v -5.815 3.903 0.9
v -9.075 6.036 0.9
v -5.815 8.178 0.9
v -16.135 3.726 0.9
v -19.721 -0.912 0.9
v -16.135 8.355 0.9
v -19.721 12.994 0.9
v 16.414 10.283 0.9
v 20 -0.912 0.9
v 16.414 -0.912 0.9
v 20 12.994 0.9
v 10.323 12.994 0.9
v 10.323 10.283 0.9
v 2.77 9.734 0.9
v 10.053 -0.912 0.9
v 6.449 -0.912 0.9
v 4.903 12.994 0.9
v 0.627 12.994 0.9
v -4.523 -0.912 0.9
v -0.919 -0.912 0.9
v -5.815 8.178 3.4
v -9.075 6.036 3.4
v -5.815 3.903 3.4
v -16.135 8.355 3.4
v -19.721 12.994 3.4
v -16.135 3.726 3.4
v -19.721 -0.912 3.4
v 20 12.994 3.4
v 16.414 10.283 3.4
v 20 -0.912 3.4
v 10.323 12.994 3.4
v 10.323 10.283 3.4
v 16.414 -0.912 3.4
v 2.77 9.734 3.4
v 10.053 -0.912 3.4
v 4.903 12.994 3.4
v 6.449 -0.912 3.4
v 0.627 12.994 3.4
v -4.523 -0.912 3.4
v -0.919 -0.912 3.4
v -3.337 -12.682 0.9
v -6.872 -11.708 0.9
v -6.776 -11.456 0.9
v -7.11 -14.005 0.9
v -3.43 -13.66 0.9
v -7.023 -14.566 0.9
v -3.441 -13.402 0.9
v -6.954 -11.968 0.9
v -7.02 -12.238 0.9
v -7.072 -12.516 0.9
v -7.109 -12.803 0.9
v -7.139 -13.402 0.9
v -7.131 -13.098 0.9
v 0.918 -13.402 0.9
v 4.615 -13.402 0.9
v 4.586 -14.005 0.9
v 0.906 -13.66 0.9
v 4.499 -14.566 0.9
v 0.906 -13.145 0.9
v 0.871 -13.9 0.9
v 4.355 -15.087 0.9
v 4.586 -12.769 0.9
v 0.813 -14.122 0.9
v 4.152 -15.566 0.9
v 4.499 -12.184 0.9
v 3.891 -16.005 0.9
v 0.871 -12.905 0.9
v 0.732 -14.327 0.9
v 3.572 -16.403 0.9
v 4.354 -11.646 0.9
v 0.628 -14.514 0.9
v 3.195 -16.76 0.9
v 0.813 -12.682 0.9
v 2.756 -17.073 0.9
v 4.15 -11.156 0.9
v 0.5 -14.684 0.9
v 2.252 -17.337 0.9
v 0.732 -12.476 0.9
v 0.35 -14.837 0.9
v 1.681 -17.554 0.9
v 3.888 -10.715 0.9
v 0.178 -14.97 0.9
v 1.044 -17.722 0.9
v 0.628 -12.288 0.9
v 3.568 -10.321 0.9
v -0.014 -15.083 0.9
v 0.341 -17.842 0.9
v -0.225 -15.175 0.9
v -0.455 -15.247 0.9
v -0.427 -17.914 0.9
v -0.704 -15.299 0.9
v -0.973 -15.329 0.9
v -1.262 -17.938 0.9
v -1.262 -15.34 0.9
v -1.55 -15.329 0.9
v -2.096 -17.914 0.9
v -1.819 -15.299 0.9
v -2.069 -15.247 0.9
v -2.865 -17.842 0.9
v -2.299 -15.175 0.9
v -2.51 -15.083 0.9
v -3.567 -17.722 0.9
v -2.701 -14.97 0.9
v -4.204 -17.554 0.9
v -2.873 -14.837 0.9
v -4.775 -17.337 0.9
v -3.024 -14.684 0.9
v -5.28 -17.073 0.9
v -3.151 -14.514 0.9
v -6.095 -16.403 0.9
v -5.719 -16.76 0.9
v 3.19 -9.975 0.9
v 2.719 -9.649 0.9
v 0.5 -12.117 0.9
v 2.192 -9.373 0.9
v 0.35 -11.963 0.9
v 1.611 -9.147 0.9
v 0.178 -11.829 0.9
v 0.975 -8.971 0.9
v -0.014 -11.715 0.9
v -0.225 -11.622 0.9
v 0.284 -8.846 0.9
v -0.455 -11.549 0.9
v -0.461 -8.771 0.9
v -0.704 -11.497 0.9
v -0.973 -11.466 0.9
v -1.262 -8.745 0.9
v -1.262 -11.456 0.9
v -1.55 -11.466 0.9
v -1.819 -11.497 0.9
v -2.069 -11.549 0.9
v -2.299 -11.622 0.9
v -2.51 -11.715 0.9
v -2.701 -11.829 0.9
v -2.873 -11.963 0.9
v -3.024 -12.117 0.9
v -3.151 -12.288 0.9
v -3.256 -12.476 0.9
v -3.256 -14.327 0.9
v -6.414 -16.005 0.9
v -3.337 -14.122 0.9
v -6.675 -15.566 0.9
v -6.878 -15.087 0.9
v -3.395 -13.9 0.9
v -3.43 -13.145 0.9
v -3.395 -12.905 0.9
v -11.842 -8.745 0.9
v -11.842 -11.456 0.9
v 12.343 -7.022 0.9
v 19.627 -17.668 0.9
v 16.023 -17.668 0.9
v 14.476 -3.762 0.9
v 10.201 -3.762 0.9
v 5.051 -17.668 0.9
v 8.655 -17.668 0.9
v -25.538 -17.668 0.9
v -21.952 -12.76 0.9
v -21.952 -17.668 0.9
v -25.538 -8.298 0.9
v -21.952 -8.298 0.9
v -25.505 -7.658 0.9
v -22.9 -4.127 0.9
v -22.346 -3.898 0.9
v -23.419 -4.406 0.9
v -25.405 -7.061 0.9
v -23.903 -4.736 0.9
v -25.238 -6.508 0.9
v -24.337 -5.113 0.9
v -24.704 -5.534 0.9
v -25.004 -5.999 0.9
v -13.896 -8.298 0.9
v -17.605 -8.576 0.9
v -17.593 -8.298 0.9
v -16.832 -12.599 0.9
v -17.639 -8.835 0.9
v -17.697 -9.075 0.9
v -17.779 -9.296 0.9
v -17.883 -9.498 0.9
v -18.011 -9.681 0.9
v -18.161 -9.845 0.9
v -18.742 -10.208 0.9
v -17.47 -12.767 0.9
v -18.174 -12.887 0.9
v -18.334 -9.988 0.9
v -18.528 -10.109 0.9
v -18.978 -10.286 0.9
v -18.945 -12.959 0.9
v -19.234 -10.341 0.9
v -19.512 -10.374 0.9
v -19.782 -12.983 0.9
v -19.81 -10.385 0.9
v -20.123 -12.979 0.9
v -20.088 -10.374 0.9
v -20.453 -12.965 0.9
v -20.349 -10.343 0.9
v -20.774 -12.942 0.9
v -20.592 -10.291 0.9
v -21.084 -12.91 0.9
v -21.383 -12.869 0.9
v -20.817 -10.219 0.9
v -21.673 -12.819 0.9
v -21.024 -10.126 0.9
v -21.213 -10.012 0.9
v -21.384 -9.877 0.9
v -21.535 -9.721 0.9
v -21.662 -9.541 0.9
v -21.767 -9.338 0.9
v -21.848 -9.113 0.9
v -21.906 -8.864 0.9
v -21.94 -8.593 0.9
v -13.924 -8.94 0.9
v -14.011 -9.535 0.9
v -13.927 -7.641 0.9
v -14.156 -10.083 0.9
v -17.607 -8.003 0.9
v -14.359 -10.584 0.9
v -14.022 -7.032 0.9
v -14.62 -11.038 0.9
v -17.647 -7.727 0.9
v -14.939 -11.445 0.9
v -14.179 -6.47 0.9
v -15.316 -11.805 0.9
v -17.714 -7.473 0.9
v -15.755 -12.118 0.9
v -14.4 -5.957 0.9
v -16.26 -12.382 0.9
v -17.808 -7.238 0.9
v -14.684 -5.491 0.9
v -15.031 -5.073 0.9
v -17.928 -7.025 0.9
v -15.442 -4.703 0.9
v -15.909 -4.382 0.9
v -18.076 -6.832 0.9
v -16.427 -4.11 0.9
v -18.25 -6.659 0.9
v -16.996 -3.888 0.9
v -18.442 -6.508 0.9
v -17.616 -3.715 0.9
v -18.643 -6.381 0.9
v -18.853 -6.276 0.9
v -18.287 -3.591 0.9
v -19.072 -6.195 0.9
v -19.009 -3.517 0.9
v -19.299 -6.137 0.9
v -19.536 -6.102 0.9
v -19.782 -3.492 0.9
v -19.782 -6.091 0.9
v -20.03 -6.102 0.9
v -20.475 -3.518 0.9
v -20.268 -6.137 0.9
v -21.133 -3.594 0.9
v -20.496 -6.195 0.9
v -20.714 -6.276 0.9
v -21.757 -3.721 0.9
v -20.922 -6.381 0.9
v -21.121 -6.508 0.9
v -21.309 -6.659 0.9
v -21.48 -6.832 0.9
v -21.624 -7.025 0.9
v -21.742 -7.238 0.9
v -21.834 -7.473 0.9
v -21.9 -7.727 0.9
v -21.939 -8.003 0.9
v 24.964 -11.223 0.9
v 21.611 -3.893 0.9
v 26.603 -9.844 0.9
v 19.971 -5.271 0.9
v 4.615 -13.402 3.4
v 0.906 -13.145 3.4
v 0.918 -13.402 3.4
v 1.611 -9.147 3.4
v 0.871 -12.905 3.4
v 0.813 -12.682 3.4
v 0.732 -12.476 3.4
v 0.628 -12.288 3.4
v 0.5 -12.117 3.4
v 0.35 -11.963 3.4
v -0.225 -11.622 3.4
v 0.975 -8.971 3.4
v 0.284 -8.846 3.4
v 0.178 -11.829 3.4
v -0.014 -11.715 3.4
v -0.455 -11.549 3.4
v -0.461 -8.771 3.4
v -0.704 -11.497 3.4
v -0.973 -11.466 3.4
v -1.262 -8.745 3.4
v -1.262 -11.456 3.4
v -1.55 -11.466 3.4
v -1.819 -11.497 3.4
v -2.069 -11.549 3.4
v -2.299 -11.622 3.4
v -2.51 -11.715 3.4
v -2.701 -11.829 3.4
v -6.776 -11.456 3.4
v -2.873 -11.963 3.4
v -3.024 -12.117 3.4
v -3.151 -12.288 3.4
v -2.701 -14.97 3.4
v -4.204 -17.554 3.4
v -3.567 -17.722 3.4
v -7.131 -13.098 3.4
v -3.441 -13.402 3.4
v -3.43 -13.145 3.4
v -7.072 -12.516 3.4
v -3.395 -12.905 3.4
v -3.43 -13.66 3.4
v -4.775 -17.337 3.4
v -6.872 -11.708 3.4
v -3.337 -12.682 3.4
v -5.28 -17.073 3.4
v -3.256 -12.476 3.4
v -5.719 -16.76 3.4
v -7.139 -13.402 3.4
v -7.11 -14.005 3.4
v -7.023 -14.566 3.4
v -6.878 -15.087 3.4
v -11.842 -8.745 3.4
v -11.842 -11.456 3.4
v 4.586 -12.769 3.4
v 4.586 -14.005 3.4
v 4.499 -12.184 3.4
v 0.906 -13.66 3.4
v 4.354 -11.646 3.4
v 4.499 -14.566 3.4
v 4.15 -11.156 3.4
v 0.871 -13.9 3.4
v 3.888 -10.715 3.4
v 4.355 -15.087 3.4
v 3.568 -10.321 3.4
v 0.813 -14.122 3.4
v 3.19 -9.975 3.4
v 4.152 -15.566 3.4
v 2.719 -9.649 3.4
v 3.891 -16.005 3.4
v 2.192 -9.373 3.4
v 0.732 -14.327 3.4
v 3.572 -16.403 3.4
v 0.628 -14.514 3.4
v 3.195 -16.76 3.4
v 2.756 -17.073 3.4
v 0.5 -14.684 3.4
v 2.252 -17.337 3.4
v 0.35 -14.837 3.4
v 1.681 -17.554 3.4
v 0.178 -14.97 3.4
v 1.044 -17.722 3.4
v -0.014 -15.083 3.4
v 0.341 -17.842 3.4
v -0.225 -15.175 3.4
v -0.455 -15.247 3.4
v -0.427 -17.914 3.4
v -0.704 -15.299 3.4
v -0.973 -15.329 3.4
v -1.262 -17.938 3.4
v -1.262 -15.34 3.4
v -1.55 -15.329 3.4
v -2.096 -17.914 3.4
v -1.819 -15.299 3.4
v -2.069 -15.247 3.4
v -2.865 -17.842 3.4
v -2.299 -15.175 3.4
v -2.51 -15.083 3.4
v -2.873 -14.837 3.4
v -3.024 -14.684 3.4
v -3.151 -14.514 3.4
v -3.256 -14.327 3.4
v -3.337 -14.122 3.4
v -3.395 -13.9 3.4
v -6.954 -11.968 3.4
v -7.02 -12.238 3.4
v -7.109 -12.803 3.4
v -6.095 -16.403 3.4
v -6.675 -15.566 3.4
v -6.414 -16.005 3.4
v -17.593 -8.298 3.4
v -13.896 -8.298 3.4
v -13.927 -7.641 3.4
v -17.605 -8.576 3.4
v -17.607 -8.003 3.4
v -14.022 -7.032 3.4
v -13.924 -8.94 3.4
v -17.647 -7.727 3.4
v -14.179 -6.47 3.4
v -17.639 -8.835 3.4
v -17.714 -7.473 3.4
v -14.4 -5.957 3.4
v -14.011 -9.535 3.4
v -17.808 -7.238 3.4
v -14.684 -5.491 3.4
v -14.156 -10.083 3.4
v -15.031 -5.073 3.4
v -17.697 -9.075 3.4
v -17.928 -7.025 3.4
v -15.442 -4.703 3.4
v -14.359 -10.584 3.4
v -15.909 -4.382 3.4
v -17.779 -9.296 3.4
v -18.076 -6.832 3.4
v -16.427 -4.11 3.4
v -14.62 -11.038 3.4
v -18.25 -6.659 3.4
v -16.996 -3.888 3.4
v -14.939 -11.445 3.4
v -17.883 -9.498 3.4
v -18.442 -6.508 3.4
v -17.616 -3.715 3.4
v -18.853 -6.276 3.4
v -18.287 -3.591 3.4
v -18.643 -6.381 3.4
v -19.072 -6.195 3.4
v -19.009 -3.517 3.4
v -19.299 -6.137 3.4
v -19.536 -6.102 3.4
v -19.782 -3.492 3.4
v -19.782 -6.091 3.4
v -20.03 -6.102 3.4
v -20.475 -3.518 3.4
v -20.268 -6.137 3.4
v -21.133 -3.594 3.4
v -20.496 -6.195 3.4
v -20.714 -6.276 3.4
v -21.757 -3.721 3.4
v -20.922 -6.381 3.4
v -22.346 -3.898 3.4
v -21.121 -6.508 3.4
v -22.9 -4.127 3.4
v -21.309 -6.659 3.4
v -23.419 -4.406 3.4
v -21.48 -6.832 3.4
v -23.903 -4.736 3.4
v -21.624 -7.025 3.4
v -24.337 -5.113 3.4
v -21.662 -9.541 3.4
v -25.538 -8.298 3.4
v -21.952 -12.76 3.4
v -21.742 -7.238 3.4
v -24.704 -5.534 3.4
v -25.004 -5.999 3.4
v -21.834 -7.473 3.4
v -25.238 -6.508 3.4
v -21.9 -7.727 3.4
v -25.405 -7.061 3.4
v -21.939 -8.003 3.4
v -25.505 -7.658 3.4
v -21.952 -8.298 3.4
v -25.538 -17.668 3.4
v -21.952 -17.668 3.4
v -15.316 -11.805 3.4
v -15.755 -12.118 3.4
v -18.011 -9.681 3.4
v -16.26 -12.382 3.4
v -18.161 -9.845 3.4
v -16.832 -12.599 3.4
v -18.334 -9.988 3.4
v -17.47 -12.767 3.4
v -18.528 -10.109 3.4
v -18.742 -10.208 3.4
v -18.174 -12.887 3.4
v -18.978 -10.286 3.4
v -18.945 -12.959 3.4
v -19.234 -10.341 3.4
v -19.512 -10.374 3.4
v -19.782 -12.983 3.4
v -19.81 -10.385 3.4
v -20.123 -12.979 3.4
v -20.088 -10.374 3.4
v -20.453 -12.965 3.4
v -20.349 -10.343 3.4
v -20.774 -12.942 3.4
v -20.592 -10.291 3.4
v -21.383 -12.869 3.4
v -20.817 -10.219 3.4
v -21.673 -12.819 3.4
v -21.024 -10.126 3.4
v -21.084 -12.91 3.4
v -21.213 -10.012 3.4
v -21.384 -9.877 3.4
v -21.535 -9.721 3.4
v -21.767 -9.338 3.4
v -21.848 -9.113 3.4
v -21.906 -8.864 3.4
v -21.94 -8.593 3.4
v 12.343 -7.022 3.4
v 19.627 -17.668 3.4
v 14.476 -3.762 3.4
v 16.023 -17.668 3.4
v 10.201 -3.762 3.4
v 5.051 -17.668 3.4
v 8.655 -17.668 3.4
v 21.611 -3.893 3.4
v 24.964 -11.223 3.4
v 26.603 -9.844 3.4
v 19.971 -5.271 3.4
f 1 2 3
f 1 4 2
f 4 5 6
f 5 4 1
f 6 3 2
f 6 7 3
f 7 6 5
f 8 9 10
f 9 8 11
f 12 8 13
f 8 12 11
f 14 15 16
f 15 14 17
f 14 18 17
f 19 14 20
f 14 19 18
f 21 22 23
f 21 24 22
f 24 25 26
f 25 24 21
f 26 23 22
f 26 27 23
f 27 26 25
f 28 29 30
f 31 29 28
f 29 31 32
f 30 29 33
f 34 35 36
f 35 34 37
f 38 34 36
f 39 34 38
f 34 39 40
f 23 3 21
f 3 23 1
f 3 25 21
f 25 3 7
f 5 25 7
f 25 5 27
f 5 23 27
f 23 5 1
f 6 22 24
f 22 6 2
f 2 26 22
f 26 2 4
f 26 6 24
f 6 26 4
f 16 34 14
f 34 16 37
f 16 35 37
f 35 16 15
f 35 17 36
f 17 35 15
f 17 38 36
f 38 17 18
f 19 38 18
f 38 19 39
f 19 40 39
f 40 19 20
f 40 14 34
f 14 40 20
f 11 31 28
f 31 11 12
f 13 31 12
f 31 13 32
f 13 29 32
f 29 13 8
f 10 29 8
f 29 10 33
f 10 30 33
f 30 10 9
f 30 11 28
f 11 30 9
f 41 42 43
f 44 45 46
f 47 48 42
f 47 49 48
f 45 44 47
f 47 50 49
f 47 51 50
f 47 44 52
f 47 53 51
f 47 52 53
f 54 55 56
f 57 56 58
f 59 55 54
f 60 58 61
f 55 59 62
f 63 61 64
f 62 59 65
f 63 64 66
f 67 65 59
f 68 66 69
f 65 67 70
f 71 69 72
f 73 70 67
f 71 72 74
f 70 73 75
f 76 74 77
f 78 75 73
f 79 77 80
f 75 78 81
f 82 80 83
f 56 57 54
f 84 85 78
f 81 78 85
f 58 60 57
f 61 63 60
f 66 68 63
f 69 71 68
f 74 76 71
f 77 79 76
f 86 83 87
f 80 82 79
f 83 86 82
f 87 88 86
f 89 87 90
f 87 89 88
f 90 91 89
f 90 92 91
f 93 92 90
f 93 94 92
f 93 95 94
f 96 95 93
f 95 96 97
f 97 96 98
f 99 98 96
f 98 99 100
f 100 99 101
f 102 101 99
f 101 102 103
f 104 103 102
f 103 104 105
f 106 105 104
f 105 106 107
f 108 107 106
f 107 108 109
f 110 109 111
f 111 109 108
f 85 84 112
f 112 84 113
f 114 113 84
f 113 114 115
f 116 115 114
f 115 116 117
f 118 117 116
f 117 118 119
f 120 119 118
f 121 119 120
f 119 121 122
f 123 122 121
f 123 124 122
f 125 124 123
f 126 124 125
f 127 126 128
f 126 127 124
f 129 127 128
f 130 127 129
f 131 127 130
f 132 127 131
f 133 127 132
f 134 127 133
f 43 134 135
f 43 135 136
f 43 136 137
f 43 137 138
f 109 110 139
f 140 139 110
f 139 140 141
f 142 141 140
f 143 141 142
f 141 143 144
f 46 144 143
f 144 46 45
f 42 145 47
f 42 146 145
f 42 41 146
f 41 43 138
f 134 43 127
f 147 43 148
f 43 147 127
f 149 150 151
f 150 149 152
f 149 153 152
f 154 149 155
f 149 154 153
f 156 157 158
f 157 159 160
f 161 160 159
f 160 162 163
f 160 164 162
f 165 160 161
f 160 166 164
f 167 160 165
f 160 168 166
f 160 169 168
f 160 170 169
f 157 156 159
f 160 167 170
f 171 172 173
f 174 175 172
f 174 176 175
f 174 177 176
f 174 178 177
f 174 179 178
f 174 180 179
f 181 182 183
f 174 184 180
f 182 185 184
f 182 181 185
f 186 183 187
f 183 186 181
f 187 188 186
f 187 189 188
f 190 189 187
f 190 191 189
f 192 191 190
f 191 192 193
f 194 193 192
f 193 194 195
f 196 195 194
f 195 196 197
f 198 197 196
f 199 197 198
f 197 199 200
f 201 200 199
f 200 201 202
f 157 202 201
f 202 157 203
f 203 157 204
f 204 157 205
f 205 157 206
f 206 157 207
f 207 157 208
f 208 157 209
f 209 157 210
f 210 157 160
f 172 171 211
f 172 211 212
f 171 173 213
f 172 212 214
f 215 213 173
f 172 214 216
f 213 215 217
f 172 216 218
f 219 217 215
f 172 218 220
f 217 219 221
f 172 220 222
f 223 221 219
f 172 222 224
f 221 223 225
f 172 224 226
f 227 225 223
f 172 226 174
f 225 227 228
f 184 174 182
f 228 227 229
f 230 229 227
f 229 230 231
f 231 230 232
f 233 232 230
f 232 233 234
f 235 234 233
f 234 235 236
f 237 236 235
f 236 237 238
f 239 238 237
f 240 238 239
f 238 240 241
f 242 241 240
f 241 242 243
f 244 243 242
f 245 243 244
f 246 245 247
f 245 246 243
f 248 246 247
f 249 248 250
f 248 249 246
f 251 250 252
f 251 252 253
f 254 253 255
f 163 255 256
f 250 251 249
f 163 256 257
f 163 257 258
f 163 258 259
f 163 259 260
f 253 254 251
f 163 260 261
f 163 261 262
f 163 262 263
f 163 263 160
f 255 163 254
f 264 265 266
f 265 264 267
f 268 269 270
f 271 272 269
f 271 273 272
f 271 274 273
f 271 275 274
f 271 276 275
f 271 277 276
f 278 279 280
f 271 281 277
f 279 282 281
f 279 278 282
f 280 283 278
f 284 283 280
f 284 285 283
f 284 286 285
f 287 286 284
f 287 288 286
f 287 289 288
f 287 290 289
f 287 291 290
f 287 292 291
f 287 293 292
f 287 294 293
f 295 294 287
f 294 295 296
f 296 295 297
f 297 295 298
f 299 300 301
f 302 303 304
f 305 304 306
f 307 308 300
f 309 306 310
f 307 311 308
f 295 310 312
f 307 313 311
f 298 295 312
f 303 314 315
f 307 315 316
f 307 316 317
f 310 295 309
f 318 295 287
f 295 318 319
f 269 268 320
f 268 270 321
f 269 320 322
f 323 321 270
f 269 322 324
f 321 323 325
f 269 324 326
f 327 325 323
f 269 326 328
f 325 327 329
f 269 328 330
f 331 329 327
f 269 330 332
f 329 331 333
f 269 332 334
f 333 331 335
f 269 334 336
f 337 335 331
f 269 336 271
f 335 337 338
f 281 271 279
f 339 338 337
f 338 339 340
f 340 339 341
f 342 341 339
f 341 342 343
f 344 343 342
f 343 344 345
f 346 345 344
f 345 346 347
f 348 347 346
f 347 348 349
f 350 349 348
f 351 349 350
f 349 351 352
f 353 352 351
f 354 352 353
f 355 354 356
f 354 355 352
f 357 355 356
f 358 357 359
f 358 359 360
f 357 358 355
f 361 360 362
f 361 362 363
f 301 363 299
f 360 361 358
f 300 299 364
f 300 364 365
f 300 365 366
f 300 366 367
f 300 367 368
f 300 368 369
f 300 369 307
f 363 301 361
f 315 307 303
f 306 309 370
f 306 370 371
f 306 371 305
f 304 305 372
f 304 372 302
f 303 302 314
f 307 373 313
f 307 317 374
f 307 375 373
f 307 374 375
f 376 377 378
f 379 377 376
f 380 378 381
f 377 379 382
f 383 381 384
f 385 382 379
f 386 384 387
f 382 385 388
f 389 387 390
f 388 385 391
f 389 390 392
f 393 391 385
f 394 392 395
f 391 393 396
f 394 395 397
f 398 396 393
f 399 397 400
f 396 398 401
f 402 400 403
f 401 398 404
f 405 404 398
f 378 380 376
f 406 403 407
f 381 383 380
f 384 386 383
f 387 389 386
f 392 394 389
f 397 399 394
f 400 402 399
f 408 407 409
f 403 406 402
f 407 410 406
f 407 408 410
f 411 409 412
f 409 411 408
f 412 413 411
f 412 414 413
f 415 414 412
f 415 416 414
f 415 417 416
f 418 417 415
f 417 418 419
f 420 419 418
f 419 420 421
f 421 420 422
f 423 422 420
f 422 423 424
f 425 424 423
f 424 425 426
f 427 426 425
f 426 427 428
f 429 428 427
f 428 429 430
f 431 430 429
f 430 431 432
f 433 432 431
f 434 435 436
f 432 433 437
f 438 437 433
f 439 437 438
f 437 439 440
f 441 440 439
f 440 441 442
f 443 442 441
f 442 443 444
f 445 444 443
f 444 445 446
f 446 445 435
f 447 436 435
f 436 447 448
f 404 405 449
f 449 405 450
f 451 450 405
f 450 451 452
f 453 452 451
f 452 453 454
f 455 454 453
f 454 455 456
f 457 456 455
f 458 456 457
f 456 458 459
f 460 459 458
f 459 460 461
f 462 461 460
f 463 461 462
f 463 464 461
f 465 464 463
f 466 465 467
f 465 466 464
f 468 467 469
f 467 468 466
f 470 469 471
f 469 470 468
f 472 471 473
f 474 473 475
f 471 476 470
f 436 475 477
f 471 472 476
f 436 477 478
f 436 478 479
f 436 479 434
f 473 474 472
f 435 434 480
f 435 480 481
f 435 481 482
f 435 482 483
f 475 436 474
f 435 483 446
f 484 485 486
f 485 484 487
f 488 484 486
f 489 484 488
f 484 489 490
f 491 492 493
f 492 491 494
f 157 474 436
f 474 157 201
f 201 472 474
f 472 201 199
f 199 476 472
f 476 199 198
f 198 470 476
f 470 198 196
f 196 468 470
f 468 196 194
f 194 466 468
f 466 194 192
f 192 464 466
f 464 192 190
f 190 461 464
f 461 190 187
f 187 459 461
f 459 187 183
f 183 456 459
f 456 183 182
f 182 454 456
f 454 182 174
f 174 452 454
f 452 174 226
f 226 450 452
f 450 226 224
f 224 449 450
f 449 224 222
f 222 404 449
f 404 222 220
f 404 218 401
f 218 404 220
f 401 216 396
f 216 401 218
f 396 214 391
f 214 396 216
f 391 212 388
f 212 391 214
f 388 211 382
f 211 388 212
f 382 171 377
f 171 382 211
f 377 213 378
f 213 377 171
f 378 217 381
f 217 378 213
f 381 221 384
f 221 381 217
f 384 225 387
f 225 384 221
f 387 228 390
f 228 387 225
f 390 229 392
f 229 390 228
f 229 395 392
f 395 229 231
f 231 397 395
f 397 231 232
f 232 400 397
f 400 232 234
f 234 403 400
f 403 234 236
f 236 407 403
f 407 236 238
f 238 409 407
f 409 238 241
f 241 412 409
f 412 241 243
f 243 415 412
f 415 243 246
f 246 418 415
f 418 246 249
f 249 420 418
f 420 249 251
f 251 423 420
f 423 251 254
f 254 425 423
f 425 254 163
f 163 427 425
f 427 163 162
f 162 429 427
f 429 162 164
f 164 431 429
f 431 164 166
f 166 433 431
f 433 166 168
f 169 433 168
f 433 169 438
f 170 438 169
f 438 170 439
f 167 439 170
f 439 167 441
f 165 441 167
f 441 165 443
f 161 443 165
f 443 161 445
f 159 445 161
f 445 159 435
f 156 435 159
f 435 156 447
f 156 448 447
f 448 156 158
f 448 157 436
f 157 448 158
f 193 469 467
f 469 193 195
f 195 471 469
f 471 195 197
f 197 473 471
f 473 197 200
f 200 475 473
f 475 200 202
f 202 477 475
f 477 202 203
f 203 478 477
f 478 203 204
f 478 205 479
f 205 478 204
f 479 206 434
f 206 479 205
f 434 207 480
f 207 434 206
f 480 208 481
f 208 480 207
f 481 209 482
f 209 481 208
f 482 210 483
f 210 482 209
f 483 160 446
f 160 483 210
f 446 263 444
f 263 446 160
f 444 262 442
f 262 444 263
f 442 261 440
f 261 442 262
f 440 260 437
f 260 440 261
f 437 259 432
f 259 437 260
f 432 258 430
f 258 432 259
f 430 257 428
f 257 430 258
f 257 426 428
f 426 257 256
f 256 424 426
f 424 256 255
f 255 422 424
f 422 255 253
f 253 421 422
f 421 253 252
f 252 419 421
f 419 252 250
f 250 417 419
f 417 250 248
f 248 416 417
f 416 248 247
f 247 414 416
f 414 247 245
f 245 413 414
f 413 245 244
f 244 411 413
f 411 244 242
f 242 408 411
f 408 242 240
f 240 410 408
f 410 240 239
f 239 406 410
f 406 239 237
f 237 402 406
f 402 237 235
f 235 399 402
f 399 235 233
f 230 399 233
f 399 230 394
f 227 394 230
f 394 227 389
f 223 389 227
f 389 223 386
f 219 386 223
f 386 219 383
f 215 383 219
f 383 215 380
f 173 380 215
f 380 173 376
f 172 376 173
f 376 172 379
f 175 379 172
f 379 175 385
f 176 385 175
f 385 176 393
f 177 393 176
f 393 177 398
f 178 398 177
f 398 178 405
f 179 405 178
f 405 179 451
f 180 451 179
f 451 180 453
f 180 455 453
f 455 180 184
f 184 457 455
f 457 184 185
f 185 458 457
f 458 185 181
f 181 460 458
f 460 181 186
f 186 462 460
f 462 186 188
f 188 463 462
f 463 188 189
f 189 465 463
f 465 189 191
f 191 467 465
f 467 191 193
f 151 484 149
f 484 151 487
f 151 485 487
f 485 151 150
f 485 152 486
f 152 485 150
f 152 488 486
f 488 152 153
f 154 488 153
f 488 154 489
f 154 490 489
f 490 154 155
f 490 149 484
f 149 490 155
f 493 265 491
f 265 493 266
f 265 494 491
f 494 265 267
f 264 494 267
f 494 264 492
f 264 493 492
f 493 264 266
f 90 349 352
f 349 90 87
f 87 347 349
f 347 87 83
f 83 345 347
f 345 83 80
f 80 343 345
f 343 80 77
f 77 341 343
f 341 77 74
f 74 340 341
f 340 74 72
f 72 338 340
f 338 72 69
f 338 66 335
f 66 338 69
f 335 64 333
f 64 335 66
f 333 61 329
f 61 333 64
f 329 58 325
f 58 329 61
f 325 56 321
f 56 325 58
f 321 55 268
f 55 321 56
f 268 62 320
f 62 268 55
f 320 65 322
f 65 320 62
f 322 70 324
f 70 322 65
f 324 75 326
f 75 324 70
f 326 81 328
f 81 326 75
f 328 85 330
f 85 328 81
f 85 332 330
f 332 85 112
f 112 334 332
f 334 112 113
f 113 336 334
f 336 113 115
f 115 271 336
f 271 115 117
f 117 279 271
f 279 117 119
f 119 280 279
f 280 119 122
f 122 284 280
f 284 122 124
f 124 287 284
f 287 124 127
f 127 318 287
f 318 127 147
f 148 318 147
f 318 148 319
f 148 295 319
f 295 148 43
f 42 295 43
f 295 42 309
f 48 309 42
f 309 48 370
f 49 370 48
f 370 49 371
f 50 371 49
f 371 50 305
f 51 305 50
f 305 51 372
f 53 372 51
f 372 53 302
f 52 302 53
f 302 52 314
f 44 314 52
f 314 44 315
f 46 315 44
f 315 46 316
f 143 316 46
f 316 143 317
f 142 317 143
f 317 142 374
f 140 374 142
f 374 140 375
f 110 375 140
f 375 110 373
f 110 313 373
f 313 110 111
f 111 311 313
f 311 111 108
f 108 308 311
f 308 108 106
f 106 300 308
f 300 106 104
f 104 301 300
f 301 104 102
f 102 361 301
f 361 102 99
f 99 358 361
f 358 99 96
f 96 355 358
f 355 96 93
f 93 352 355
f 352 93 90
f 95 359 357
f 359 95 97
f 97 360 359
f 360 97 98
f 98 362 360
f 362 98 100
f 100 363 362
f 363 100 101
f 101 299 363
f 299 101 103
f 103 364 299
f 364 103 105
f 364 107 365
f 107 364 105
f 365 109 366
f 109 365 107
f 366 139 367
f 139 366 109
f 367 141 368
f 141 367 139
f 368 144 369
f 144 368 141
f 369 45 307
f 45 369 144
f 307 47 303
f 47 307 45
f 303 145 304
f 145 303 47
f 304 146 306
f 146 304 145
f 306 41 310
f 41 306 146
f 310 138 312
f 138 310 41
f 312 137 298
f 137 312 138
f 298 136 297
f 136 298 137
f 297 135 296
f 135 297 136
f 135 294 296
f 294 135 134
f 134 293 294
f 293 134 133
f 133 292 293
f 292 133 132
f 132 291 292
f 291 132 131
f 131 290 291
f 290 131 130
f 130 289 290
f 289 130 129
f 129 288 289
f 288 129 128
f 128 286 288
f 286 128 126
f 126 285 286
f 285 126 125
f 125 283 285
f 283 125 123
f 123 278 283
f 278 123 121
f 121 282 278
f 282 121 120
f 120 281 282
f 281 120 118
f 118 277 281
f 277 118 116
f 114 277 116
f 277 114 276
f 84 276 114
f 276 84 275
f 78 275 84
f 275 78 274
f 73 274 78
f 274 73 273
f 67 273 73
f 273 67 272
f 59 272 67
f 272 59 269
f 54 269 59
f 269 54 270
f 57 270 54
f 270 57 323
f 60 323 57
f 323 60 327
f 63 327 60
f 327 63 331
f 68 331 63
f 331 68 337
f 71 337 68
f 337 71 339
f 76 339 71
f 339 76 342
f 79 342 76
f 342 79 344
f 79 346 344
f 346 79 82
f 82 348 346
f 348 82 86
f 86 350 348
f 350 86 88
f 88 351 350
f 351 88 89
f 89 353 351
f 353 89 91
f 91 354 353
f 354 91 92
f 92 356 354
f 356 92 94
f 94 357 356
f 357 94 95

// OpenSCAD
$fn = 48;
  // syllabics (overlaid on icon, tallest)
  translate([0, 5.878, 0.900]) linear_extrude(height=2.500) text("ᐅᐱᒣ", size=13.735, halign="center", valign="center", font="Euphemia UCAS:style=Bold");
  translate([0, -10.878, 0.900]) linear_extrude(height=2.500) text("ᑭᓀᐱᐠ", size=13.735, halign="center", valign="center", font="Euphemia UCAS:style=Bold");
